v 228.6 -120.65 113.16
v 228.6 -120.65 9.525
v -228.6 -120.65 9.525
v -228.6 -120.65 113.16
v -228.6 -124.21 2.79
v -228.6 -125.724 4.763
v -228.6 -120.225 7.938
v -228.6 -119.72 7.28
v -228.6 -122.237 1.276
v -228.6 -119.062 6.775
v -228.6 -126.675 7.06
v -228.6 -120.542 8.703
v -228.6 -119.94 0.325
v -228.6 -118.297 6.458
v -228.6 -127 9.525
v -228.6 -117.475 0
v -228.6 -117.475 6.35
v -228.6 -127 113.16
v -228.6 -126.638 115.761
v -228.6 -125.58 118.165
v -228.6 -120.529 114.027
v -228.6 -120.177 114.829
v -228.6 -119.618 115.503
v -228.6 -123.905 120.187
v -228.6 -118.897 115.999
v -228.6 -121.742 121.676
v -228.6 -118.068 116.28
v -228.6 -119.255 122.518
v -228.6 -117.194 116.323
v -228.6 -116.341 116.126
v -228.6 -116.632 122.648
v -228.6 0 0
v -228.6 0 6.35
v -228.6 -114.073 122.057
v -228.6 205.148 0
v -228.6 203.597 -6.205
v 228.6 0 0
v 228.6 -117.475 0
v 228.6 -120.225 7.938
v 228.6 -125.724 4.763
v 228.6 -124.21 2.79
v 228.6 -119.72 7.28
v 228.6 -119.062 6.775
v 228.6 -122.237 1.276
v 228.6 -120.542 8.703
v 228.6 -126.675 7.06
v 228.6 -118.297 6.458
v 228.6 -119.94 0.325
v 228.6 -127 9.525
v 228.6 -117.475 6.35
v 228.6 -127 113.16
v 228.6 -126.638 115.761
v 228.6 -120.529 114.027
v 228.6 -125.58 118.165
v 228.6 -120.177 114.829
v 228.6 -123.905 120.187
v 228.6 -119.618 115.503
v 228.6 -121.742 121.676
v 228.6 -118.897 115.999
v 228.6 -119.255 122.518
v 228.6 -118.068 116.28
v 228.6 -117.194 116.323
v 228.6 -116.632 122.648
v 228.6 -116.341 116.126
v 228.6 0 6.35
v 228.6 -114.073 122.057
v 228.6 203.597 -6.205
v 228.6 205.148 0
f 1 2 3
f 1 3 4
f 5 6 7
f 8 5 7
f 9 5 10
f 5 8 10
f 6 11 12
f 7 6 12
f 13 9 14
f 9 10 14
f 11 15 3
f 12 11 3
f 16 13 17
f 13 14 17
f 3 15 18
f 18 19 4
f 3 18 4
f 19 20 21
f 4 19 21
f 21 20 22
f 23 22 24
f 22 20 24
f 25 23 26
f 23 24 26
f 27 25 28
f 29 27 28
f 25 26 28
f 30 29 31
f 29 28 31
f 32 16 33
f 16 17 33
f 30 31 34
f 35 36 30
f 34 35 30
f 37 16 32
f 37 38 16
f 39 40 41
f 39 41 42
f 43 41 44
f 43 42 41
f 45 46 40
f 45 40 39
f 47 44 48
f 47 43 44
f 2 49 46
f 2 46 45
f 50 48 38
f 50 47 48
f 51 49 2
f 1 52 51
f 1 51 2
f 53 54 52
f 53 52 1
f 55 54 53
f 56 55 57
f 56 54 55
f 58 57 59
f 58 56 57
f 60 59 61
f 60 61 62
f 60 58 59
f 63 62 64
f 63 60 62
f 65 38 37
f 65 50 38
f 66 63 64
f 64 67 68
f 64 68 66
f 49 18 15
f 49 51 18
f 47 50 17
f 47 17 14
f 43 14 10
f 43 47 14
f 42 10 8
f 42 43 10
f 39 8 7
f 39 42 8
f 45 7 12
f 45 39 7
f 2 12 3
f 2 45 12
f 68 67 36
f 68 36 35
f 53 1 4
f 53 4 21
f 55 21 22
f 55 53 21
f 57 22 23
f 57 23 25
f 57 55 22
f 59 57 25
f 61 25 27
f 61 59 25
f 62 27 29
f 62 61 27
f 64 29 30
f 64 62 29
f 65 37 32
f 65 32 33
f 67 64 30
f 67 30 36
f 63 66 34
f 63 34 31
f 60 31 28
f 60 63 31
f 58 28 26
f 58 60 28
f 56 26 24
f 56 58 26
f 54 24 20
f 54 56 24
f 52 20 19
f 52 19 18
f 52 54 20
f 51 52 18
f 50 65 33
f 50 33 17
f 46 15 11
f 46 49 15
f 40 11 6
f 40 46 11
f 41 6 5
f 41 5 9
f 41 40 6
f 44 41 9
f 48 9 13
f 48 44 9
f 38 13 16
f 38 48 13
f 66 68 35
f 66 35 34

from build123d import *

# Parameters (mm, degrees)
F1_DEPTH      = 228.6
F1_DEPTH_BACK = 228.6


with BuildPart() as f1:
    # F0 (on Right) → F1 (new body, two sides)
    with BuildSketch(Plane.YZ) as f1_sk:
        with BuildLine():
            Line((-117.475, 0), (0, 0))
            Line((0, 0), (0, 6.35))
            Line((0, 6.35), (-117.475, 6.35))
            ThreePointArc((-117.475, 6.35), (-119.720064, 7.279936), (-120.65, 9.525))
            Line((-120.65, 9.525), (-120.65, 113.160496))
            ThreePointArc((-120.65, 113.160496), (-119.275056, 115.775916), (-116.341071, 116.126104))
            Line((-116.341071, 116.126104), (203.596992, -6.205272))
            Line((203.596992, -6.205272), (205.148099, 0))
            Line((205.148099, 0), (-114.073214, 122.05732))
            ThreePointArc((-114.073214, 122.05732), (-122.875167, 121.006757), (-127, 113.160496))
            Line((-127, 113.160496), (-127, 9.525))
            ThreePointArc((-127, 9.525), (-124.210192, 2.789808), (-117.475, 0))
        make_face()
    extrude(amount=F1_DEPTH)
    extrude(f1_sk.sketch, amount=-F1_DEPTH_BACK)


solid = f1.part
